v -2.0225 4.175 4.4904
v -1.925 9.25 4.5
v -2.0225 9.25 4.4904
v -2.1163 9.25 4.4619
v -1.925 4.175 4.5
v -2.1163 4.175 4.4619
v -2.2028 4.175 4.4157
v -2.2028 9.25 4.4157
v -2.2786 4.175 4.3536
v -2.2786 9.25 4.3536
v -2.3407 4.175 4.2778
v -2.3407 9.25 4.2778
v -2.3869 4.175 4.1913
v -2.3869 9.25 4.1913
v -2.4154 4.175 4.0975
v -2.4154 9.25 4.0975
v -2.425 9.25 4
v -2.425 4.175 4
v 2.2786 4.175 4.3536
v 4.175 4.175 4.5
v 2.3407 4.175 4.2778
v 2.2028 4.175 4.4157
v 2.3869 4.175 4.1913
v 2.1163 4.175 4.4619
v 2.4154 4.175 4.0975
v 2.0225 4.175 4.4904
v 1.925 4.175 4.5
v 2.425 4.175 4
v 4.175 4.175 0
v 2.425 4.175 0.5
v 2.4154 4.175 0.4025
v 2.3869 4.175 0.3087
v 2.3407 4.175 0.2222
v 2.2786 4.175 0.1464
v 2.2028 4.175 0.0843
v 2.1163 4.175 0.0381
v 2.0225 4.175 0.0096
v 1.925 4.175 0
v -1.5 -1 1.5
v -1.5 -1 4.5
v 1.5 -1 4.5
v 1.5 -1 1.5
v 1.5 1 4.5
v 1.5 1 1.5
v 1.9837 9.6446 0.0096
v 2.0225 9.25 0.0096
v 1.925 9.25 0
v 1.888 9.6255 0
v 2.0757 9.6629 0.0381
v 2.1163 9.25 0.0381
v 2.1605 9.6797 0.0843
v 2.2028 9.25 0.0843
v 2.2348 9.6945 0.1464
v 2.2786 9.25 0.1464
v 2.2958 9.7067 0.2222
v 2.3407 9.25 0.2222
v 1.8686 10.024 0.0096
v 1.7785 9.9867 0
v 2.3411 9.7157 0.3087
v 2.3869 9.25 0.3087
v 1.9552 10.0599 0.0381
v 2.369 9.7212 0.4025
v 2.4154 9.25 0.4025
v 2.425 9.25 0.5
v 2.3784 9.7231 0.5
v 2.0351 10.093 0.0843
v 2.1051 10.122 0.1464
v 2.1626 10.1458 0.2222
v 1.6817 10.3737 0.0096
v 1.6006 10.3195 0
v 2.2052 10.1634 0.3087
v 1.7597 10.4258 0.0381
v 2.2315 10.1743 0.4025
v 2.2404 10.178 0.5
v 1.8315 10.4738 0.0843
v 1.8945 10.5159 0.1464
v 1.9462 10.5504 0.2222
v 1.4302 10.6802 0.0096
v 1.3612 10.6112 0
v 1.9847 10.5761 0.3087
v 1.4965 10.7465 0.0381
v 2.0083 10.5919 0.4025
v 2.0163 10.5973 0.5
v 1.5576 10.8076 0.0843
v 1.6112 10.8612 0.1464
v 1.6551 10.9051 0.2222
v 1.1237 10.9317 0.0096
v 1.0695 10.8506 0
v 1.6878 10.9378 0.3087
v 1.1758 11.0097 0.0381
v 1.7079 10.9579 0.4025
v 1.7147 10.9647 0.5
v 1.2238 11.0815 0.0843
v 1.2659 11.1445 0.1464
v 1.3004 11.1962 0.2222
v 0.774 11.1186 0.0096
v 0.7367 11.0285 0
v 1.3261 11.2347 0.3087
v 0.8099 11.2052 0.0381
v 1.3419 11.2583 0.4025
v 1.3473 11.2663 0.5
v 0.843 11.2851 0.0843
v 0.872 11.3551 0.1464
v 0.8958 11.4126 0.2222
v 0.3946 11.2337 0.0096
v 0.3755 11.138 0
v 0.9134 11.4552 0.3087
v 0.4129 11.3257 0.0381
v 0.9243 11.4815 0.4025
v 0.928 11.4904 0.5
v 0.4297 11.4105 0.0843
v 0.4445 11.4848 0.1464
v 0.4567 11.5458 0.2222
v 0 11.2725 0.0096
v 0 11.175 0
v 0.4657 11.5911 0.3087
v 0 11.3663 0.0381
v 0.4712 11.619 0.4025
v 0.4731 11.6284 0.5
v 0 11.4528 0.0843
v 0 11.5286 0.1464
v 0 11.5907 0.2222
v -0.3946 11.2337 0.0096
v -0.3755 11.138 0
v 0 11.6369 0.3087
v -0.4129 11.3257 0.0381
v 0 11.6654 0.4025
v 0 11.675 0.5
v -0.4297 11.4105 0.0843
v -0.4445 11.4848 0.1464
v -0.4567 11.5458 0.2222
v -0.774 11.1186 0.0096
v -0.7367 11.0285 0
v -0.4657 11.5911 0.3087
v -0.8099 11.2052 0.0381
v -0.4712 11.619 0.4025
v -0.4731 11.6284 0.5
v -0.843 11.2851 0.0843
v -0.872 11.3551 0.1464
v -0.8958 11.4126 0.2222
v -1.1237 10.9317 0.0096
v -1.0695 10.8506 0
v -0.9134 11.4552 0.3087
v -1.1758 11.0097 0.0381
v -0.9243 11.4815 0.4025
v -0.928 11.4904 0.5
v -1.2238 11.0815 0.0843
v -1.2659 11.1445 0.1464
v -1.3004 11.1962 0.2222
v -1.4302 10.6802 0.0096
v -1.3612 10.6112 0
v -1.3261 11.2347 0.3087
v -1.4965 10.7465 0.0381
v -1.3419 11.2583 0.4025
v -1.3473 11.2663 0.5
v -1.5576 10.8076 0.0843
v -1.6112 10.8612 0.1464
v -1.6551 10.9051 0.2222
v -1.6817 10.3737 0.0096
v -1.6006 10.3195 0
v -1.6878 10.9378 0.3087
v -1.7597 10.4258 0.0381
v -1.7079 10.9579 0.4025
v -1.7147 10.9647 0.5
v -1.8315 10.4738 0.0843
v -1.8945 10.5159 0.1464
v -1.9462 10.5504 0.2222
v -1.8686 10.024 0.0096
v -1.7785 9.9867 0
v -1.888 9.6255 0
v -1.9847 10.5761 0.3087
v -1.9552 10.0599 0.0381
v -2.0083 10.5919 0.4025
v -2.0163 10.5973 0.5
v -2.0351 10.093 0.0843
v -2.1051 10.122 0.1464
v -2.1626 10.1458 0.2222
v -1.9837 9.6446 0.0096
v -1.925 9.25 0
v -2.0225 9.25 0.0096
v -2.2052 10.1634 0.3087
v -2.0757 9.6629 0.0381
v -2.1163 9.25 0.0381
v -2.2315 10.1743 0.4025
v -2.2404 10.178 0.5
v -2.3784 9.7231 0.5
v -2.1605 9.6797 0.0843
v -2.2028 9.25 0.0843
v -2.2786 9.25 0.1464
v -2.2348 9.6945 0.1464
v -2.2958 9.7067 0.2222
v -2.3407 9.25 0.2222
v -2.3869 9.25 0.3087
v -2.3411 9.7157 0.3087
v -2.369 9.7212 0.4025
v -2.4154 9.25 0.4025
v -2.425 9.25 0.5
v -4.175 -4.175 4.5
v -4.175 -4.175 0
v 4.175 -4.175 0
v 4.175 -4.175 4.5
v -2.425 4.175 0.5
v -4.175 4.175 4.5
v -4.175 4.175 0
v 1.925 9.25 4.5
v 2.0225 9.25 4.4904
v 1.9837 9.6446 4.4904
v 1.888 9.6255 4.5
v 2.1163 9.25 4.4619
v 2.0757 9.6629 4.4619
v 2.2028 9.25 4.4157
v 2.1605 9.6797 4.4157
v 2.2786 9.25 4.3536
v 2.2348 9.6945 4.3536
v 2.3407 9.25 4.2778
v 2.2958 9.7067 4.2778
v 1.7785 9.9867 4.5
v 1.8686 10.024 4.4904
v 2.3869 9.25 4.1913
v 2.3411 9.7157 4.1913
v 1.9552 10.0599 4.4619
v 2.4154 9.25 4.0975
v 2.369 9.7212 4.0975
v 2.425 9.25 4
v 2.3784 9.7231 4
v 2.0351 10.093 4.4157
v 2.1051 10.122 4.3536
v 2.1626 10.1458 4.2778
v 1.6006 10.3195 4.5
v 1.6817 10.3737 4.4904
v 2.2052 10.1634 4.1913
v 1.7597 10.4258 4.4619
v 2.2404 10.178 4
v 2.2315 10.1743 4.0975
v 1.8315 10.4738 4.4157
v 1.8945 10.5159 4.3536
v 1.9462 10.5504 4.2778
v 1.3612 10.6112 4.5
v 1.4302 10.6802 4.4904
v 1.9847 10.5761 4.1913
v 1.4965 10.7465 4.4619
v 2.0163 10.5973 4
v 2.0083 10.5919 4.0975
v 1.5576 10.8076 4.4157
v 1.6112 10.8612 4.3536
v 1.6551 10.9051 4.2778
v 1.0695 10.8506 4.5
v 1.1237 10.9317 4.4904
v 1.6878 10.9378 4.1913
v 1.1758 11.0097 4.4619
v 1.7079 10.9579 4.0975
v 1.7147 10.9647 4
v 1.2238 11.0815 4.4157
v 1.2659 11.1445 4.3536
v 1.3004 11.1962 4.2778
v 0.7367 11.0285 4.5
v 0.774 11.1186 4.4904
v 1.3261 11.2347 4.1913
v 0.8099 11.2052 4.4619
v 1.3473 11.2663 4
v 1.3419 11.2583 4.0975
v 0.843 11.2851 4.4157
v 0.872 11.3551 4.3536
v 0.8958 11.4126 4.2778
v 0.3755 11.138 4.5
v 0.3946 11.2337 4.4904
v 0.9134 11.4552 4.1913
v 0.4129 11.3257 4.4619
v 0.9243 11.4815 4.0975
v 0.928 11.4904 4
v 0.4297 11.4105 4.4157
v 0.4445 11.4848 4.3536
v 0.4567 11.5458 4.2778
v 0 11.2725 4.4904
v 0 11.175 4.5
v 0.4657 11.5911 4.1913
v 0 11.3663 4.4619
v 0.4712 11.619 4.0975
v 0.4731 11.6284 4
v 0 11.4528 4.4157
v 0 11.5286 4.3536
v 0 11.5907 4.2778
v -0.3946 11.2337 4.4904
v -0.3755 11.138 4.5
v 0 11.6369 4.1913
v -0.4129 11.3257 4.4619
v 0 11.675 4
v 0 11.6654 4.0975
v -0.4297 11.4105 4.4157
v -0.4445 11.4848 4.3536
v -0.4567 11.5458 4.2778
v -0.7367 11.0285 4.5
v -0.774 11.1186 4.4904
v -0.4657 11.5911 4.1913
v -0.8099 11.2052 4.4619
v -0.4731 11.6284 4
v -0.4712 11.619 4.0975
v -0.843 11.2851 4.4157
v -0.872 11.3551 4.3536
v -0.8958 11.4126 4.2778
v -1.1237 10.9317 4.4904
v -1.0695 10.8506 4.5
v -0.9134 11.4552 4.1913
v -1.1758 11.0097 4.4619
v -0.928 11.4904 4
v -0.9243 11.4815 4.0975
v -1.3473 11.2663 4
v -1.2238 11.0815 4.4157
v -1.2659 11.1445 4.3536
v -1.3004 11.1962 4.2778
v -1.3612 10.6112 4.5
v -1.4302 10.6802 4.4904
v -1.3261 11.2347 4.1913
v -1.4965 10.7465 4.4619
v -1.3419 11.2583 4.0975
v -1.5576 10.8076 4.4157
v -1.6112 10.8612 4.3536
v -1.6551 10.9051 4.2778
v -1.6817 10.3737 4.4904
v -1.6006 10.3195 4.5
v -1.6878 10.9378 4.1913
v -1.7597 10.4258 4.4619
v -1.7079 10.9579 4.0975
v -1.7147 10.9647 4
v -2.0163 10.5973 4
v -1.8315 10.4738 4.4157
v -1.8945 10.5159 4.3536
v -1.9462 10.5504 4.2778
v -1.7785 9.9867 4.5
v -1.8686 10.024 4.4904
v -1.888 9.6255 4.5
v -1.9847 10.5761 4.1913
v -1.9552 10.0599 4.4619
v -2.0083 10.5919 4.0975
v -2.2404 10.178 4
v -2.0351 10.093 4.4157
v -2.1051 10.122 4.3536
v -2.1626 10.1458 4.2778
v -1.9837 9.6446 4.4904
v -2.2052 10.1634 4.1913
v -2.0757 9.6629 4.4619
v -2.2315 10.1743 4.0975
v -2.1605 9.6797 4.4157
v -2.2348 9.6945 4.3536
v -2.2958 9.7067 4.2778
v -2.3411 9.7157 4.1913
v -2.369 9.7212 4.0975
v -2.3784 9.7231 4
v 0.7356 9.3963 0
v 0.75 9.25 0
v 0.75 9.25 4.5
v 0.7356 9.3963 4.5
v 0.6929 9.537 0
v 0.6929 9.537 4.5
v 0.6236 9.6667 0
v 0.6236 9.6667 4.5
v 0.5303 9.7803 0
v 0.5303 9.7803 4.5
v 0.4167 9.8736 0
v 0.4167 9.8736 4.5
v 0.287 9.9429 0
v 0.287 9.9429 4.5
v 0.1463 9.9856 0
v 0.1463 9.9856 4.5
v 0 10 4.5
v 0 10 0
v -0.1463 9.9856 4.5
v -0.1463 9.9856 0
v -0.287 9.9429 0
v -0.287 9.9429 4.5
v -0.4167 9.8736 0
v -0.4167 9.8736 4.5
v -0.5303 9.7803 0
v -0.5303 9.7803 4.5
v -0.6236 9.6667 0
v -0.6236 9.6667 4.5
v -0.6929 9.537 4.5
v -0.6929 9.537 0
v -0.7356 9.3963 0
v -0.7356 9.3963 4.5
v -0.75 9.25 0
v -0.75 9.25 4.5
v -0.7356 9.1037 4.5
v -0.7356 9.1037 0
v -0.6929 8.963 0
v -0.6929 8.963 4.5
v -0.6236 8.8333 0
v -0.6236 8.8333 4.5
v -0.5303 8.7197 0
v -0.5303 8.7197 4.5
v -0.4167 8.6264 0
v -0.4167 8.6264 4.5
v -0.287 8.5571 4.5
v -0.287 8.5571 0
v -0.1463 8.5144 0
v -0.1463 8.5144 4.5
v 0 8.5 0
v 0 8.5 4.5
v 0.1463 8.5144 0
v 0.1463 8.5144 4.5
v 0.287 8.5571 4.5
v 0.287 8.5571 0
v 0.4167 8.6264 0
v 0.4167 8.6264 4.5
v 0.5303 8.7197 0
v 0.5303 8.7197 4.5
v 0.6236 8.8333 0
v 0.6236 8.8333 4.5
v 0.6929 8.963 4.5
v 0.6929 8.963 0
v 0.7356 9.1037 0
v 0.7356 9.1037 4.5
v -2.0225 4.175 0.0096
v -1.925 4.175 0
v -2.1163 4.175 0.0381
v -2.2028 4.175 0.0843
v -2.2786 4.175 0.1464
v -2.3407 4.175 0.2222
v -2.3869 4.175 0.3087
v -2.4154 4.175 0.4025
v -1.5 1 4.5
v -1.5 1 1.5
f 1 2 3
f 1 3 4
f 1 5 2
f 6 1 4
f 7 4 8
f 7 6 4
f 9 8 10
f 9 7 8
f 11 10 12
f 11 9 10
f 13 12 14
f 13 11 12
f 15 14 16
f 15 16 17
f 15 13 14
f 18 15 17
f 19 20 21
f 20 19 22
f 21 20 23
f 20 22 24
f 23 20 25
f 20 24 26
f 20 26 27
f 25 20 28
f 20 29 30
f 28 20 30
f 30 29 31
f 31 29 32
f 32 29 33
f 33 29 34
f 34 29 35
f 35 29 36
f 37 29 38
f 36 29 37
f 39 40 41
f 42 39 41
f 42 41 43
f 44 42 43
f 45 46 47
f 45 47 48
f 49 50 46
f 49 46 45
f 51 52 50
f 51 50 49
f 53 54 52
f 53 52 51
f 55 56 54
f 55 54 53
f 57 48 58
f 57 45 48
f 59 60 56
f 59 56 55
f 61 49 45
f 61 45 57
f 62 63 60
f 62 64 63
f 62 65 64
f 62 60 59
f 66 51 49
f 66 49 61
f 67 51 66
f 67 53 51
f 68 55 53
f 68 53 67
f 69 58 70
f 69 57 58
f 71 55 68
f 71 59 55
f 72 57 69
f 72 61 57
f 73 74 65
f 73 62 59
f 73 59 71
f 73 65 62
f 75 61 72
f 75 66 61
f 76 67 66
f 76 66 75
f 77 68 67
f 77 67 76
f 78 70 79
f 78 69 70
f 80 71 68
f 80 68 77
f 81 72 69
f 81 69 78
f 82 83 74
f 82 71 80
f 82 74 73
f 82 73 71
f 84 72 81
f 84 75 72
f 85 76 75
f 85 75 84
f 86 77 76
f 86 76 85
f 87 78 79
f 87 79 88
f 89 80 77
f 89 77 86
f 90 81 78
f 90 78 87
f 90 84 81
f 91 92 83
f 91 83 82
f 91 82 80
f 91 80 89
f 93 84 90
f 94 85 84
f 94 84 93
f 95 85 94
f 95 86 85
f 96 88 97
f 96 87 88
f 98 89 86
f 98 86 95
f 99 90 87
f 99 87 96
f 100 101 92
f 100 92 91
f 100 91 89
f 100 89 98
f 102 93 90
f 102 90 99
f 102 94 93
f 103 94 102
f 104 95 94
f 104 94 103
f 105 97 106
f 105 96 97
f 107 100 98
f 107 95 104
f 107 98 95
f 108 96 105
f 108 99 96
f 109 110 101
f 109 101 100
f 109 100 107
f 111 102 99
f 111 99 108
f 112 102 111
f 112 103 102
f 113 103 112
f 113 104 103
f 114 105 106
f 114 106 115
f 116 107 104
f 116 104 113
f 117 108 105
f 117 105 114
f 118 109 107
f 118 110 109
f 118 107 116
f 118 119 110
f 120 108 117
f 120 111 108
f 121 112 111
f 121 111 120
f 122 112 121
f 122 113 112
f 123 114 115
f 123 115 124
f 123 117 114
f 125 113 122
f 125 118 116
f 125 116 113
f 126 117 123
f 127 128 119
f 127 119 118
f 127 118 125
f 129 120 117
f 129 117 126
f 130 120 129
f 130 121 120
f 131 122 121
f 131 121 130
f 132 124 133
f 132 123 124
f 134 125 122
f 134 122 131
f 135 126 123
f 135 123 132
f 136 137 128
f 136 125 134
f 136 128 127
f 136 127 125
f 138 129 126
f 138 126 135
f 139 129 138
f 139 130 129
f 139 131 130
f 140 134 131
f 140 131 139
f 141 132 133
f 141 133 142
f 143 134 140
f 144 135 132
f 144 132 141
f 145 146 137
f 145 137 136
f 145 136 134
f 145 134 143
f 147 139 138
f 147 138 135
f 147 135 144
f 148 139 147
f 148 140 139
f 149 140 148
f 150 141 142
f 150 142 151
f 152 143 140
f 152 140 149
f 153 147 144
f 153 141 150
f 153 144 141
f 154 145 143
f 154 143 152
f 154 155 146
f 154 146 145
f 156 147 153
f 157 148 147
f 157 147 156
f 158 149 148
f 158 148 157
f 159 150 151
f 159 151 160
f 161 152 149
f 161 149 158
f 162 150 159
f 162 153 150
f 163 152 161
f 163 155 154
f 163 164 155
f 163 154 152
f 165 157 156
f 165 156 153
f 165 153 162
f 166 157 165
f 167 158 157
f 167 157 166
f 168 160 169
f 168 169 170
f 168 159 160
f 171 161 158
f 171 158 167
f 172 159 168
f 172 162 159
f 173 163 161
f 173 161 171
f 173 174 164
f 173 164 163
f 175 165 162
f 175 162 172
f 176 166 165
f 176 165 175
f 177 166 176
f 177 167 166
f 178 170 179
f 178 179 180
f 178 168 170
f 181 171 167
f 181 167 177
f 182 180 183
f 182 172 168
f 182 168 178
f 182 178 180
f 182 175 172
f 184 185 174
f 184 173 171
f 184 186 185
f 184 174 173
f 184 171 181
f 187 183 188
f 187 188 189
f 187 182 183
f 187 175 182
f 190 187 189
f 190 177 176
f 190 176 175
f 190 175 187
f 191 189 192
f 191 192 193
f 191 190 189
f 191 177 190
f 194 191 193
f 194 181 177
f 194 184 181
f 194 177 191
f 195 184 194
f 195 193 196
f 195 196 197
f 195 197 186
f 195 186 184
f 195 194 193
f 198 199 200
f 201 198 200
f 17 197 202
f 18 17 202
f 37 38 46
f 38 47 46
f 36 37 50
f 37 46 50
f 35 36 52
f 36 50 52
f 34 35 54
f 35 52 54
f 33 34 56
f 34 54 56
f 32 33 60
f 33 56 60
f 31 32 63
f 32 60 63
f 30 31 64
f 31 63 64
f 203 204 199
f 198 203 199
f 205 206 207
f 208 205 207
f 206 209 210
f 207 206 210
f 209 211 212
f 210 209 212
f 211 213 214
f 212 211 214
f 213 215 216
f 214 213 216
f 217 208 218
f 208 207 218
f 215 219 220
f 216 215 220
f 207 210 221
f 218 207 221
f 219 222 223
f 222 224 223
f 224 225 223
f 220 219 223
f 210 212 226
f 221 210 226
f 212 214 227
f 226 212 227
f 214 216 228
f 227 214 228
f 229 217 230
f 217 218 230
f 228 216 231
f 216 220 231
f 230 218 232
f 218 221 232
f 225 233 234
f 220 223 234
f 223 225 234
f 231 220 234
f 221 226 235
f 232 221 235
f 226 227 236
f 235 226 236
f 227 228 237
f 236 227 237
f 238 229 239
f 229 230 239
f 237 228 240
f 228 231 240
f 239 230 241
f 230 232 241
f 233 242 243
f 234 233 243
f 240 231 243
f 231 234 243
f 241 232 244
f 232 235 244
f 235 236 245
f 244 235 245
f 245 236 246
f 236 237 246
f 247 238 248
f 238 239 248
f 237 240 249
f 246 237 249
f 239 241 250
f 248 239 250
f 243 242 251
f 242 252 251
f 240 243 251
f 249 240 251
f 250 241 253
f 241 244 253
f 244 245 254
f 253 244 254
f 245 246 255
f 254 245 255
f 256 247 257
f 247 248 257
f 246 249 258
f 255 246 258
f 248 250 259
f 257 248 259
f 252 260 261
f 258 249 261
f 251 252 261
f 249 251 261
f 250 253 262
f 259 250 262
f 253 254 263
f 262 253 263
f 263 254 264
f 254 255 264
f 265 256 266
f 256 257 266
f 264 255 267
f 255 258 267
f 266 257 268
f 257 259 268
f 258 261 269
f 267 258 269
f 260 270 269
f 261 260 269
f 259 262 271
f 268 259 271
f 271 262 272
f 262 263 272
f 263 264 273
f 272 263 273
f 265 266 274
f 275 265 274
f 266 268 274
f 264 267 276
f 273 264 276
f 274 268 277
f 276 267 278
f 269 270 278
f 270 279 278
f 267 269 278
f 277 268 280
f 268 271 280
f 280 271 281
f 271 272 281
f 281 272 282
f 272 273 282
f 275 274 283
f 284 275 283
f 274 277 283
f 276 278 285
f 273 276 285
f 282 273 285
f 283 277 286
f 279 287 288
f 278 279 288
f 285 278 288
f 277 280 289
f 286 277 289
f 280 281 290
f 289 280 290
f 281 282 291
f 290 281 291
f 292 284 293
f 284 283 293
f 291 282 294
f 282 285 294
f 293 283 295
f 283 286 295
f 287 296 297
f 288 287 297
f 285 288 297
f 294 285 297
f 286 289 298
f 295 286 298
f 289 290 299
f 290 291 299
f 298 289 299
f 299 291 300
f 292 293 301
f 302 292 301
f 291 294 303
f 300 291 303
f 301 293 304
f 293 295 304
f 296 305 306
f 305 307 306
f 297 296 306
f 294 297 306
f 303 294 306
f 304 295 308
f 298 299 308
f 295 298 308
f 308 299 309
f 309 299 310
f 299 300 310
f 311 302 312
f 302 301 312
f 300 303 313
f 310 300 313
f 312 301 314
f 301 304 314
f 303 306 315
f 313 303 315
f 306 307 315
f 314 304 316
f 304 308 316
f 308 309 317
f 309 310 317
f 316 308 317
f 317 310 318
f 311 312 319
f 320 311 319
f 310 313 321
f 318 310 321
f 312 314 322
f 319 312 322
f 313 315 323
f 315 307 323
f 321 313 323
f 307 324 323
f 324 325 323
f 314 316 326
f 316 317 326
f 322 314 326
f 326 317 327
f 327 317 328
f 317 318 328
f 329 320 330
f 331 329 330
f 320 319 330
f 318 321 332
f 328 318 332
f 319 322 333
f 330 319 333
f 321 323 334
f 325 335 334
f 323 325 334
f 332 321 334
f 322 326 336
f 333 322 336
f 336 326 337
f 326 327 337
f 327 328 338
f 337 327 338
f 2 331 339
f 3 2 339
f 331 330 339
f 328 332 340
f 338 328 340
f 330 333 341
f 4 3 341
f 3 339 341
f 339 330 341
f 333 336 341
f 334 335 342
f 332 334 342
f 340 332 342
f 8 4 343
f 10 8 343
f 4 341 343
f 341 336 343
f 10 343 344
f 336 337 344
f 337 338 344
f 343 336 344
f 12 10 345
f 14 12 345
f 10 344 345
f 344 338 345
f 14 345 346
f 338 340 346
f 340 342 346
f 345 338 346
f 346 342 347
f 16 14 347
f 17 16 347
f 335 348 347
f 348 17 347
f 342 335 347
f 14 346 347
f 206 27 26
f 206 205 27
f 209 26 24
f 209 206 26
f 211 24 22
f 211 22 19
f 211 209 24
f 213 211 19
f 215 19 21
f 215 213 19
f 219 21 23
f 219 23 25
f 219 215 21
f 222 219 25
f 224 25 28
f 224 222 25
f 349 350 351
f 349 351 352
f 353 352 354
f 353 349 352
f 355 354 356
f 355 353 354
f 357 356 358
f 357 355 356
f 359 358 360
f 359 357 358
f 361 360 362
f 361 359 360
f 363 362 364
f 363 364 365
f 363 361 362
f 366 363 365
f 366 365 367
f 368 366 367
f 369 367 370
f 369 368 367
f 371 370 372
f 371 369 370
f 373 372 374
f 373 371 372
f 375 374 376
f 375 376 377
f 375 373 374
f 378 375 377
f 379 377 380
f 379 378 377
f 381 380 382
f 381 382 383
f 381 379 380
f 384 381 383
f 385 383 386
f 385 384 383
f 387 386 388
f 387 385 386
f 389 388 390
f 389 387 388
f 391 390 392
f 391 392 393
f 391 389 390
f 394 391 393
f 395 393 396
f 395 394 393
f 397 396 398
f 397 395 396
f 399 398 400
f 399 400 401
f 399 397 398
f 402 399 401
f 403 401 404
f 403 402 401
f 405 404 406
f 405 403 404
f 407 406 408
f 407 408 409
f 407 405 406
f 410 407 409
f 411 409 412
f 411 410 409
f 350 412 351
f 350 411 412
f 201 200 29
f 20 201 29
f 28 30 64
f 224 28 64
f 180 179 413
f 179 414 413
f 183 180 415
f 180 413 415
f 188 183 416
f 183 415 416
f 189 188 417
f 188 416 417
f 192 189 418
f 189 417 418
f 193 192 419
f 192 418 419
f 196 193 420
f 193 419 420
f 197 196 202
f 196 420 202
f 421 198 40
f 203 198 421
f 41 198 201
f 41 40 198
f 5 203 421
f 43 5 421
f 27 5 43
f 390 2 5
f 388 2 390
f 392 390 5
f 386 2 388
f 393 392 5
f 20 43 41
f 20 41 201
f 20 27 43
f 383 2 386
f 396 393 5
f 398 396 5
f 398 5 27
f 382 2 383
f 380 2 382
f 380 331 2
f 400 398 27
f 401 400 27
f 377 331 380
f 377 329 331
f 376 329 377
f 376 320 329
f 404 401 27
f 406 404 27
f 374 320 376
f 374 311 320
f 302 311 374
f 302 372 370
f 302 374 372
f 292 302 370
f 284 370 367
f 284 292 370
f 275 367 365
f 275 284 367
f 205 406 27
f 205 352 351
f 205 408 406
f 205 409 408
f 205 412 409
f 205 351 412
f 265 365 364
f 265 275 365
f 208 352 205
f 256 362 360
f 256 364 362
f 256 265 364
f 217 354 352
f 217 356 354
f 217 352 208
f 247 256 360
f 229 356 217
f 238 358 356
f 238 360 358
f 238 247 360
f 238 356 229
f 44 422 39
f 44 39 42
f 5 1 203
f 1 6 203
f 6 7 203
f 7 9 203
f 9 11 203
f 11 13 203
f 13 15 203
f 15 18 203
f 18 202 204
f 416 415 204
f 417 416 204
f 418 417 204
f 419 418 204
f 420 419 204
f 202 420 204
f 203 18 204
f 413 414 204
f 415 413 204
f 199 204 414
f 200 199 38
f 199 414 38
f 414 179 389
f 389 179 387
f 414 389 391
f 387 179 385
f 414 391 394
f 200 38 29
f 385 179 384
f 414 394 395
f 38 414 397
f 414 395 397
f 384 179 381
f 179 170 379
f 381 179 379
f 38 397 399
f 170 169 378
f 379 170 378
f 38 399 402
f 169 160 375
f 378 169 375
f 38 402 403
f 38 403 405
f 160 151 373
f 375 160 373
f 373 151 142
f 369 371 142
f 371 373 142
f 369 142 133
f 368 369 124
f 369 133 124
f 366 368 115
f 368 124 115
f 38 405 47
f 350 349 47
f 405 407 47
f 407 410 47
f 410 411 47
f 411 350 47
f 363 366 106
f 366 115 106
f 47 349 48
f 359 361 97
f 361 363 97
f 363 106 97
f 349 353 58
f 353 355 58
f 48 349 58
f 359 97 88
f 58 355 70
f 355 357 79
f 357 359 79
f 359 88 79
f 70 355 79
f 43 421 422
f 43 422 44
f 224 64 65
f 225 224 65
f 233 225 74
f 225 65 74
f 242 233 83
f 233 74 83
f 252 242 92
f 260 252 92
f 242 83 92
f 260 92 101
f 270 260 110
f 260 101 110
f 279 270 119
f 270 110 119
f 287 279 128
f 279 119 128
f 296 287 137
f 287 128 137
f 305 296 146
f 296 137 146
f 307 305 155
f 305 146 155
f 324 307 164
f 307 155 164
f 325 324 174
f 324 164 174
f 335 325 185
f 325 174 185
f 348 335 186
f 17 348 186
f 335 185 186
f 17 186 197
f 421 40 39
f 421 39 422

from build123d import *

# Parameters (mm, degrees)
F0_R     = 0.75
F1_DEPTH = 4.5
F2_W     = 3
F2_H     = 2
F3_DEPTH = 3
F4_R     = 0.5


with BuildPart() as f1:
    # F0 (on Top) → F1 (new body)
    with BuildSketch(Plane.XY):
        Polygon((-2.425, 4.175), (-4.175, 4.175), (-4.175, -4.175), (4.175, -4.175), (4.175, 4.175), (2.425, 4.175), align=None)
        with BuildLine():
            Line((-2.425, 9.25), (-2.425, 4.175))
            Line((-2.425, 4.175), (2.425, 4.175))
            Line((2.425, 4.175), (2.425, 9.25))
            ThreePointArc((2.425, 9.25), (0, 11.675), (-2.425, 9.25))
        make_face()
        with Locations((0, 9.25)):
            Circle(F0_R, mode=Mode.SUBTRACT)
    extrude(amount=F1_DEPTH)

    # F2 (on face) → F3 (cut)
    with BuildSketch(Plane.XY.offset(4.5)):
        Rectangle(F2_W, F2_H)
    extrude(amount=-F3_DEPTH, mode=Mode.SUBTRACT)

    # F4
    f4_edges = [f1.edges().sort_by_distance(p)[0] for p in [
        (0, 11.675, 0),
        (2.425, 6.7125, 0),
        (-2.425, 6.7125, 0),
        (0, 11.675, 4.5),
        (2.425, 6.7125, 4.5),
        (-2.425, 6.7125, 4.5),
    ]]
    fillet(f4_edges, radius=F4_R)


solid = f1.part
